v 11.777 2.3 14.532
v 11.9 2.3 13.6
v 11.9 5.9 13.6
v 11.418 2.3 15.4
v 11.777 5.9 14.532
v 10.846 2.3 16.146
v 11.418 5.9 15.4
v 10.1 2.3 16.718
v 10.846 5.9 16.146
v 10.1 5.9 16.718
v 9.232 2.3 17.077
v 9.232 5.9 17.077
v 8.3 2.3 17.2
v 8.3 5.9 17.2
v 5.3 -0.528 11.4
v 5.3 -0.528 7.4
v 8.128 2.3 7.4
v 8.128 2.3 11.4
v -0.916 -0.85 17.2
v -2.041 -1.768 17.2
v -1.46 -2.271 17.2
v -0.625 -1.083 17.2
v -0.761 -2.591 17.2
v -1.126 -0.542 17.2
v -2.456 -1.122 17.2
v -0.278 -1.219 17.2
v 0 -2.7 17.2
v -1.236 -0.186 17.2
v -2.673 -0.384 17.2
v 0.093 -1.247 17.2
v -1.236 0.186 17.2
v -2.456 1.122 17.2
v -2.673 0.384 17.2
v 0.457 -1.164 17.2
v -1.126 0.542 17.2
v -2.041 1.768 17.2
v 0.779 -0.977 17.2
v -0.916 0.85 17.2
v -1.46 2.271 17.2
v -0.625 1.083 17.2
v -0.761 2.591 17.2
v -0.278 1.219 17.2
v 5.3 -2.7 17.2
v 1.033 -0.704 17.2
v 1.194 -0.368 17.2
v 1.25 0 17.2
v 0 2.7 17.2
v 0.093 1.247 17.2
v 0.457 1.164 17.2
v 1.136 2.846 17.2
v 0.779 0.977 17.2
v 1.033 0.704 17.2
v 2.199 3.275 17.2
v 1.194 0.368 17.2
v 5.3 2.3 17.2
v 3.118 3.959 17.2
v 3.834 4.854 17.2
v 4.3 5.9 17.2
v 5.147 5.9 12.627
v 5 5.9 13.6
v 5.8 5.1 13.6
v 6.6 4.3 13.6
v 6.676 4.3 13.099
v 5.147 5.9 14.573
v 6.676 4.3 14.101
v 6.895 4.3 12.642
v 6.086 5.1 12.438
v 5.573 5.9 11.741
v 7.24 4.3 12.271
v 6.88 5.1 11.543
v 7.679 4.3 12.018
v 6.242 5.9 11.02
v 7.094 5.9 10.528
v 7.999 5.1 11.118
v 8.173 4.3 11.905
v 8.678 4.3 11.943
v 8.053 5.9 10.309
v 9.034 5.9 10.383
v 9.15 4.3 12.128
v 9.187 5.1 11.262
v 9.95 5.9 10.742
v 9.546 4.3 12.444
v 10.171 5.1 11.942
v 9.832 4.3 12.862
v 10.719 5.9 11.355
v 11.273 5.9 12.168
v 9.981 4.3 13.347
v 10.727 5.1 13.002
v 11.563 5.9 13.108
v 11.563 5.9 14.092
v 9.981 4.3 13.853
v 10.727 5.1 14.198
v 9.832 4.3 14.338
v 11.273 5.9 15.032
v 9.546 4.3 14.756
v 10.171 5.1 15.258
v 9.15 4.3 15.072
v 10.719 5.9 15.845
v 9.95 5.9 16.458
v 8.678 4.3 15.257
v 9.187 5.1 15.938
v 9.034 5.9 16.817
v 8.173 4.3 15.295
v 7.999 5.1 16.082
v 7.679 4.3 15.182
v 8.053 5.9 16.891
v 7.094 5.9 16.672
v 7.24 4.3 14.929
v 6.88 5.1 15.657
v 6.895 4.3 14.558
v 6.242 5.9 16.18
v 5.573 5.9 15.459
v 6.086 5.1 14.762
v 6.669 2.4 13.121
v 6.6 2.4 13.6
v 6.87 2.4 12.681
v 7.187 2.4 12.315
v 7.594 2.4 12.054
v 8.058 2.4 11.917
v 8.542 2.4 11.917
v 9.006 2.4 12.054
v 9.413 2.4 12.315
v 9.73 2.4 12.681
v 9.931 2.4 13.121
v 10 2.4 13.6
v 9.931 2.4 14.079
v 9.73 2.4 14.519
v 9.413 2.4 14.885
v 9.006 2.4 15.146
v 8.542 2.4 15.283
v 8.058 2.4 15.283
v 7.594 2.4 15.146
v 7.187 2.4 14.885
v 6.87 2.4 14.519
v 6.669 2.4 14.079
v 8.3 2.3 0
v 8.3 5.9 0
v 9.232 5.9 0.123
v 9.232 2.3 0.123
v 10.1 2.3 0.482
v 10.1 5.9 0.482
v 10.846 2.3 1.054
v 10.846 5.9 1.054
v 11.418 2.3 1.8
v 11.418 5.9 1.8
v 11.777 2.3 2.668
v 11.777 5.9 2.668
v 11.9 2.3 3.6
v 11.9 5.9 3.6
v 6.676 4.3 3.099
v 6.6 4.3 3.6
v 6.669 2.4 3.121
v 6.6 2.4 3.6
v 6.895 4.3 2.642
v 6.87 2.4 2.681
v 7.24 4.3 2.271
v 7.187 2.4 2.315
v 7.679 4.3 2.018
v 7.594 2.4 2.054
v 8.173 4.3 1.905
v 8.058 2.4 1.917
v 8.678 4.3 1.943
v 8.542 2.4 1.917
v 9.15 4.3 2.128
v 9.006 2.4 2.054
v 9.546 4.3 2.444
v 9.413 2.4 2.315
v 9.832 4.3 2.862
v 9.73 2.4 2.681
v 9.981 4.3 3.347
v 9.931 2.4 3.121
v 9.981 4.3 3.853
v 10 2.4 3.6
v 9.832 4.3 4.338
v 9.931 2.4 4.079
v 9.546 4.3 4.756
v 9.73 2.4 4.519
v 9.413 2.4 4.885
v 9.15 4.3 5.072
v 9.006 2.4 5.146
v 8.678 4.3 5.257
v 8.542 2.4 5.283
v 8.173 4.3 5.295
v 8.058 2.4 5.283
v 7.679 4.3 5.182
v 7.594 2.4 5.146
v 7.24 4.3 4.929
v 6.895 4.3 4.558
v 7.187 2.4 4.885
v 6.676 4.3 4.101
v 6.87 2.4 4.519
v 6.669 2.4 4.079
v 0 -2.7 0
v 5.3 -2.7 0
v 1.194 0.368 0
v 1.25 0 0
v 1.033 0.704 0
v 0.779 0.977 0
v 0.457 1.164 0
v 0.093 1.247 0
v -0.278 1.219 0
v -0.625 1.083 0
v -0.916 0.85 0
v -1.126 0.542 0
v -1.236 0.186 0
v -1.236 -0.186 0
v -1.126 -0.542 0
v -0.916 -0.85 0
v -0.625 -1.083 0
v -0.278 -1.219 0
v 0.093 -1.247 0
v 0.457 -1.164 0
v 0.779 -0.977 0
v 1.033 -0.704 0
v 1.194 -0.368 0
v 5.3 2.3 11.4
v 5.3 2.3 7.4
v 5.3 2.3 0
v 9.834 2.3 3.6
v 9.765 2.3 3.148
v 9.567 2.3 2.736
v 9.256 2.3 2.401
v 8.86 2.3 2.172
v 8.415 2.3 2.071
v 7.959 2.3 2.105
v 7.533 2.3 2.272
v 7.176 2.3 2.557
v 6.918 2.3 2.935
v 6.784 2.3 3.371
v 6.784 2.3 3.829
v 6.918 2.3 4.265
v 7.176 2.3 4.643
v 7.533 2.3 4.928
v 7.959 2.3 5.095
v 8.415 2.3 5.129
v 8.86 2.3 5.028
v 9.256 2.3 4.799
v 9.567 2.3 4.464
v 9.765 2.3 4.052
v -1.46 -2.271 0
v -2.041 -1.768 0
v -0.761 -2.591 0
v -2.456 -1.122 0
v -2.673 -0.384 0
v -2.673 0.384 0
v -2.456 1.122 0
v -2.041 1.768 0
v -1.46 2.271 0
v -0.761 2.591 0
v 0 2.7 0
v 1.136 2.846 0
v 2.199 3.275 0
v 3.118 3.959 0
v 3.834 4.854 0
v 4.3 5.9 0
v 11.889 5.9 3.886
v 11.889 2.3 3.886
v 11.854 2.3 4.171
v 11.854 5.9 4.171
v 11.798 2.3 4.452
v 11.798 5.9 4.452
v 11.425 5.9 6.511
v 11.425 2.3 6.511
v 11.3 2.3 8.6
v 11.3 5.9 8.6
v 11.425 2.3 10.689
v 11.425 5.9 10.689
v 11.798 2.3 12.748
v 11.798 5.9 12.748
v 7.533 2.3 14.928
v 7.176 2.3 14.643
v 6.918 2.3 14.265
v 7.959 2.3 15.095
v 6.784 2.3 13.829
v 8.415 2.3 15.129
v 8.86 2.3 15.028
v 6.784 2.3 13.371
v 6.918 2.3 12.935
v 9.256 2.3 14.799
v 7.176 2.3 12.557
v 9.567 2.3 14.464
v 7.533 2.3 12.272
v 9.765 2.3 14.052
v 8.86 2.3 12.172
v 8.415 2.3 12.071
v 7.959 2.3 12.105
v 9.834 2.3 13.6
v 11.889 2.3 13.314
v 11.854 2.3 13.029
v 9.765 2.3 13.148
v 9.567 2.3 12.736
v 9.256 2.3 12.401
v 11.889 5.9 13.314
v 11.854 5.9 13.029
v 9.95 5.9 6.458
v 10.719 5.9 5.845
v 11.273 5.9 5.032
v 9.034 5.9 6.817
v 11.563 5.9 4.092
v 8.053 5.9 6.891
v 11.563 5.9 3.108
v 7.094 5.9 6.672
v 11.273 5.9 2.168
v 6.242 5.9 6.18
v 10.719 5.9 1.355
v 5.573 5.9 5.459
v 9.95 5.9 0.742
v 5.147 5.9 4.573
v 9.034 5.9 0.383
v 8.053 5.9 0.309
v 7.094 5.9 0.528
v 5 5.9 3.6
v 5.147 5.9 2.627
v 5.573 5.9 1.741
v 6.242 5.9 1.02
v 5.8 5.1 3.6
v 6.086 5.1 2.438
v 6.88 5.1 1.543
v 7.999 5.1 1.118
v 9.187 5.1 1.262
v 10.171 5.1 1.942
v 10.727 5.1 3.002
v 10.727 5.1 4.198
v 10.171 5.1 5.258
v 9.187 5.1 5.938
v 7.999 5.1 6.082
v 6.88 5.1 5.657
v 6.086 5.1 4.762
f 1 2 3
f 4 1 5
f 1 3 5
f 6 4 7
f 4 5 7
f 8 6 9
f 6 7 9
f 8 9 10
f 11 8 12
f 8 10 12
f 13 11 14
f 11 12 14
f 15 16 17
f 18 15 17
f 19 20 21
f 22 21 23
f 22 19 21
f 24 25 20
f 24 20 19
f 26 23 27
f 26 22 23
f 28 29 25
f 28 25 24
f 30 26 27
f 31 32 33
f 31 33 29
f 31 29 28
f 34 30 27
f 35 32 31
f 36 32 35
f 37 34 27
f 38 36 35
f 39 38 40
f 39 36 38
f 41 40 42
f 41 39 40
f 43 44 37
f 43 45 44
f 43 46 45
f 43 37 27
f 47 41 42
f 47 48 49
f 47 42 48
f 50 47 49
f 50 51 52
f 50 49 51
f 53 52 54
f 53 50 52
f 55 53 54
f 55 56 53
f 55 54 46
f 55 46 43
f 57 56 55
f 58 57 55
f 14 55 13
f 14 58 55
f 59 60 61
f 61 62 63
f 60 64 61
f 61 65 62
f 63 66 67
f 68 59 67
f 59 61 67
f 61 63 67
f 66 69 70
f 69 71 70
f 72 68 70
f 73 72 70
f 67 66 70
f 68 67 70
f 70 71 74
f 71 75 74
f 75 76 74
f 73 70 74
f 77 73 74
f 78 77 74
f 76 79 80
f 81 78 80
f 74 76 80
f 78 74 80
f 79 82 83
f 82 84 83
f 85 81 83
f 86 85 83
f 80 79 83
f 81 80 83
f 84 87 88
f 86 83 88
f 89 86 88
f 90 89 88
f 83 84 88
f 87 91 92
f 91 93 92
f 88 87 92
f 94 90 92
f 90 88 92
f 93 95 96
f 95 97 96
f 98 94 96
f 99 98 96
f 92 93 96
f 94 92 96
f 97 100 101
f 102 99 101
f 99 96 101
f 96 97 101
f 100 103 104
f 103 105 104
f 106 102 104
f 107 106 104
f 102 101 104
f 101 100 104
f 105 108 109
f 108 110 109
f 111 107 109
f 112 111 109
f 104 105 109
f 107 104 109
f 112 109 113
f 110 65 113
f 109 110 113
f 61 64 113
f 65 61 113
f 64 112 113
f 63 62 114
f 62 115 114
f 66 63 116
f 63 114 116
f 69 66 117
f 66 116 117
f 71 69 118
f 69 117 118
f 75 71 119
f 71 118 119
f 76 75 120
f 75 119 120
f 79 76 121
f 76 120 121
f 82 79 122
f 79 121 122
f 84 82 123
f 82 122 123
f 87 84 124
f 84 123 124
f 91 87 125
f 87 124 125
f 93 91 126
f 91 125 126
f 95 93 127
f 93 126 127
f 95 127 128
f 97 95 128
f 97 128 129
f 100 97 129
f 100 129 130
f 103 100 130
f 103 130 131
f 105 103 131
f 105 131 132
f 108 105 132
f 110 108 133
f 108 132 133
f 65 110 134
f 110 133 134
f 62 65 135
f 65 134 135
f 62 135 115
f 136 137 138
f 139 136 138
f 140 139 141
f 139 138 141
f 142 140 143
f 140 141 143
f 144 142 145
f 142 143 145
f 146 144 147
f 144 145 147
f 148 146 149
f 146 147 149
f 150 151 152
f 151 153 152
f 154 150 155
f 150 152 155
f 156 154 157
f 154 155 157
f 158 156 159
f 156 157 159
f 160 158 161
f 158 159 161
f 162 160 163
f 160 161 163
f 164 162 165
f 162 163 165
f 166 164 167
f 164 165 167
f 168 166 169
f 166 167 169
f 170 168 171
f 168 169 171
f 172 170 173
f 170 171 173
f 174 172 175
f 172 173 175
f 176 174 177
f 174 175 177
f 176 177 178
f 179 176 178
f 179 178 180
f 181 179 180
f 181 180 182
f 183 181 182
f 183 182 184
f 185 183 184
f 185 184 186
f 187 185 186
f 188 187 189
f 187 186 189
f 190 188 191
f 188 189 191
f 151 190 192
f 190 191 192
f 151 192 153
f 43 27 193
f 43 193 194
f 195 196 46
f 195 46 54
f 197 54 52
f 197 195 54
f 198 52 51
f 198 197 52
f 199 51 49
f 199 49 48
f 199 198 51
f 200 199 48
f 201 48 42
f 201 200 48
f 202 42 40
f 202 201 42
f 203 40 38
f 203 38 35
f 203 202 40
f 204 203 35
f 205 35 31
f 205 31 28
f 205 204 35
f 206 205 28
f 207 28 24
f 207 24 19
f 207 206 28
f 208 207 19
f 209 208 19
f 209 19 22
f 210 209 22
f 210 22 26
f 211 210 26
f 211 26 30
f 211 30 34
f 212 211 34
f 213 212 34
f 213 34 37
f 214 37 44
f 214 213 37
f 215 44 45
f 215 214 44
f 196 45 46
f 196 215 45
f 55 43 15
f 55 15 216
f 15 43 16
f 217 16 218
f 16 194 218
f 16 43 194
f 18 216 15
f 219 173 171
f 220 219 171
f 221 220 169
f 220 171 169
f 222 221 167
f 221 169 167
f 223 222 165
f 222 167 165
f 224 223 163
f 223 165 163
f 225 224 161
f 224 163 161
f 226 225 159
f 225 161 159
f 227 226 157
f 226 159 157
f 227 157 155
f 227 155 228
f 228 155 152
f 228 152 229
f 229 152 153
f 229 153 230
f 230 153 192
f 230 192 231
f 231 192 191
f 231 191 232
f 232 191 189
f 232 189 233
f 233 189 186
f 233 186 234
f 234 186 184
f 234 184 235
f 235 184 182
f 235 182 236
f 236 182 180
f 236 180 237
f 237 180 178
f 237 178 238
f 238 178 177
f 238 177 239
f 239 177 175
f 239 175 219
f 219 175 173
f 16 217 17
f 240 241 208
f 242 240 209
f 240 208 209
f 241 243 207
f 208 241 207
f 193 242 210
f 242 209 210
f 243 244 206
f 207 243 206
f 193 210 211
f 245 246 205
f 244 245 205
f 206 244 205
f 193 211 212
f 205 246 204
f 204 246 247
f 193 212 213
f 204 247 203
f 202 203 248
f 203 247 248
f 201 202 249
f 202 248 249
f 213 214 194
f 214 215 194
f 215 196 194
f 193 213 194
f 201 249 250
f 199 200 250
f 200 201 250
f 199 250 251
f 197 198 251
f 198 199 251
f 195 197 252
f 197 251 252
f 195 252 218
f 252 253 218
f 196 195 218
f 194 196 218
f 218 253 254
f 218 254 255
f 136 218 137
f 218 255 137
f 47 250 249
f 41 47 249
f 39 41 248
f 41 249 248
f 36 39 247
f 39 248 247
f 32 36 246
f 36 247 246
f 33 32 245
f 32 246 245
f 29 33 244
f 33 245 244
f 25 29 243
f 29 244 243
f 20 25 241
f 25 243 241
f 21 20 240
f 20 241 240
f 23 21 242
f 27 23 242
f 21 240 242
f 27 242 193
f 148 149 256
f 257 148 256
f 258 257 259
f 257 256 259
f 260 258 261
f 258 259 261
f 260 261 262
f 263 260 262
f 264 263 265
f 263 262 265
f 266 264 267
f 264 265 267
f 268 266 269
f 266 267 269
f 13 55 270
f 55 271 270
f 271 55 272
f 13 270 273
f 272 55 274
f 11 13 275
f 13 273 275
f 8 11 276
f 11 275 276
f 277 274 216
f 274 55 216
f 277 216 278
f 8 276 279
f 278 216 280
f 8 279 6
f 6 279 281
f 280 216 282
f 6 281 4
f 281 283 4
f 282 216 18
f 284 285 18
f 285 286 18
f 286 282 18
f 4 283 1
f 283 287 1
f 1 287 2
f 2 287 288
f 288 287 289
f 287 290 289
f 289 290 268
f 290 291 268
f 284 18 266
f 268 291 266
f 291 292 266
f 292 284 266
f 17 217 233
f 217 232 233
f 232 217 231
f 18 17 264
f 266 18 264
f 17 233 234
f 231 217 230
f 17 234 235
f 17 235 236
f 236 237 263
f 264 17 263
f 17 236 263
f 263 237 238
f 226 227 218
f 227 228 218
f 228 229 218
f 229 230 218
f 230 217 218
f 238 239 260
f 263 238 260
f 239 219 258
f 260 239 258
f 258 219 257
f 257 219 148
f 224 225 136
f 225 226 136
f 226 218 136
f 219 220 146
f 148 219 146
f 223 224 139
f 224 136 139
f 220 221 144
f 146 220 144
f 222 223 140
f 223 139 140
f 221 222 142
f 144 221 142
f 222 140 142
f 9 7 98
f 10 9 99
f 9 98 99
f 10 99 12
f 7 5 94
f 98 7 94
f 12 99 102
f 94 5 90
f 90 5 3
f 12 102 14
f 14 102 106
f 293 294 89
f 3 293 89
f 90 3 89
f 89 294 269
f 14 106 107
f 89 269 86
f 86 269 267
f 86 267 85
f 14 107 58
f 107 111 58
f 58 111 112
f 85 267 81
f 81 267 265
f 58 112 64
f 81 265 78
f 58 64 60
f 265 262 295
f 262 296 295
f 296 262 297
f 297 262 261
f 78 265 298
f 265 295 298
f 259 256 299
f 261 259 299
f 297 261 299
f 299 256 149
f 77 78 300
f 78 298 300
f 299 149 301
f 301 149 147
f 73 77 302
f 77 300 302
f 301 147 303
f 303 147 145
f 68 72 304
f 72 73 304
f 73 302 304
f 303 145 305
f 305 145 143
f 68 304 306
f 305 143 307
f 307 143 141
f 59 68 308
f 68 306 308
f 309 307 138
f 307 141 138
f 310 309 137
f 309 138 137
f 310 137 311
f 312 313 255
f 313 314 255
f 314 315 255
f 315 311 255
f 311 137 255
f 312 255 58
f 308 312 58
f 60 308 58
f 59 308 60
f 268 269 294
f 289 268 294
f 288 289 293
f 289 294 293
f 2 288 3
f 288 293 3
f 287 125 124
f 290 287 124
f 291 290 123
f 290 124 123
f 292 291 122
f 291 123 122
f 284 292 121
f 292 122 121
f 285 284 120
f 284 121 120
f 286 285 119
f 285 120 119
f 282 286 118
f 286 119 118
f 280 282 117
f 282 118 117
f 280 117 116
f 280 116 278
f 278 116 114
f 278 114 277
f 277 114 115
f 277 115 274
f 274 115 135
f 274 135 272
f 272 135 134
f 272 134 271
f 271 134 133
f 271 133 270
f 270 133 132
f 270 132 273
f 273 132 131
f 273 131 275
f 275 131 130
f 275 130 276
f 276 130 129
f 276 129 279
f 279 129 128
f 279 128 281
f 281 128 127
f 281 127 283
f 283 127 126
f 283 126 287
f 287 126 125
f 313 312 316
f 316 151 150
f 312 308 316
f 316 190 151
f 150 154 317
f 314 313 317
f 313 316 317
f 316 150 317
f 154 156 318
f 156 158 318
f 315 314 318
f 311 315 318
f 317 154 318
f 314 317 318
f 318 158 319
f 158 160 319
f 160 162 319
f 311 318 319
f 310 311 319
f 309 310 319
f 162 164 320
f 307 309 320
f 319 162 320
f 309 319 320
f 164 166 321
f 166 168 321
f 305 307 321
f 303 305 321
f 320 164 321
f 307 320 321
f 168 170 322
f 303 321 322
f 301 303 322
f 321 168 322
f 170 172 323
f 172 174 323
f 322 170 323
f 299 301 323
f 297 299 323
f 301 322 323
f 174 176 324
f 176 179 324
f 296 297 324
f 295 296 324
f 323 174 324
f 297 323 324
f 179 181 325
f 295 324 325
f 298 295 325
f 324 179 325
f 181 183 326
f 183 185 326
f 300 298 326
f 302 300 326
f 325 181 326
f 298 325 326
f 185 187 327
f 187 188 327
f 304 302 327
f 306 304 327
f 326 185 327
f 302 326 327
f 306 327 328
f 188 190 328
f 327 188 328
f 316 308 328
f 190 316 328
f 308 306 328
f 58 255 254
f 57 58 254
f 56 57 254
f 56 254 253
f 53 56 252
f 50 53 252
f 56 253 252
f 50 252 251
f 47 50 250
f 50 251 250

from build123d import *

# Parameters (mm, degrees)
SKETCH_1_R                = 1.25
EXTRUDE_1_DEPTH           = 17.2
CUT_EXTRUDE_1_DEPTH       = 9.6
HOLE_WIZARD_1_D           = 3.4
HOLE_WIZARD_1_DEPTH       = 3.5
HOLE_WIZARD_1_CSINK_D     = 6.6
HOLE_WIZARD_1_CSINK_ANGLE = 90
HOLE_WIZARD_1_TIP         = 1.021463052
EXTRUDE_3_DEPTH           = 4


with BuildPart() as part:
    # 草图1 → 凸台-拉伸1 (new body)
    with BuildSketch(Plane.XY):
        with BuildLine():
            Line((0, -2.7), (5.3, -2.7))
            Line((5.3, -2.7), (5.3, 2.3))
            Line((5.3, 2.3), (12.8, 2.3))
            Line((12.8, 2.3), (12.8, 5.9))
            Line((12.8, 5.9), (4.3, 5.9))
            ThreePointArc((4.3, 5.9), (2.680018657, 3.58778743), (0, 2.7))
            ThreePointArc((0, 2.7), (-2.7, 0), (0, -2.7))
        make_face()
        Circle(SKETCH_1_R, mode=Mode.SUBTRACT)
    extrude(amount=EXTRUDE_1_DEPTH)

    # 草图2 → 切除-拉伸1 (cut, through all)
    with BuildSketch(Plane(origin=(0, 5.9, 0), x_dir=(1, 0, 0), z_dir=(0, 1, 0))):
        with BuildLine():
            Line((12.8, -17.2), (12.8, 0))
            Line((12.8, 0), (8.3, 0))
            ThreePointArc((8.3, 0), (10.845584412, -1.054415588), (11.9, -3.6))
            ThreePointArc((11.9, -3.6), (11.874356619, -4.028922794), (11.797791798, -4.451735016))
            ThreePointArc((11.797791798, -4.451735016), (11.3, -8.6), (11.797791798, -12.748264984))
            ThreePointArc((11.797791798, -12.748264984), (11.874356619, -13.171077206), (11.9, -13.6))
            ThreePointArc((11.9, -13.6), (10.845584412, -16.145584412), (8.3, -17.2))
            Line((8.3, -17.2), (12.8, -17.2))
        make_face()
    extrude(amount=-CUT_EXTRUDE_1_DEPTH, mode=Mode.SUBTRACT)

    # 打孔尺寸(%根据)开槽半沉头木螺钉的类型1
    with Locations(Plane(origin=(8.3, 5.9, 3.6), x_dir=(1, 0, 0), z_dir=(0, 1, 0))):
        with Locations((0, 0), (0, -10)):
            CounterSinkHole(HOLE_WIZARD_1_D / 2, HOLE_WIZARD_1_CSINK_D / 2, depth=HOLE_WIZARD_1_DEPTH, counter_sink_angle=HOLE_WIZARD_1_CSINK_ANGLE)
            with Locations((0, 0, -(HOLE_WIZARD_1_DEPTH + HOLE_WIZARD_1_TIP / 2))):  # 118° drill point
                Cone(0, HOLE_WIZARD_1_D / 2, HOLE_WIZARD_1_TIP, mode=Mode.SUBTRACT)

    # 草图5 → 凸台-拉伸3 (add)
    with BuildSketch(Plane.XY.offset(7.4)):
        Polygon((5.3, 2.3), (5.3, -0.528427125), (8.128427125, 2.3), align=None)
    extrude(amount=EXTRUDE_3_DEPTH)


solid = part.part
